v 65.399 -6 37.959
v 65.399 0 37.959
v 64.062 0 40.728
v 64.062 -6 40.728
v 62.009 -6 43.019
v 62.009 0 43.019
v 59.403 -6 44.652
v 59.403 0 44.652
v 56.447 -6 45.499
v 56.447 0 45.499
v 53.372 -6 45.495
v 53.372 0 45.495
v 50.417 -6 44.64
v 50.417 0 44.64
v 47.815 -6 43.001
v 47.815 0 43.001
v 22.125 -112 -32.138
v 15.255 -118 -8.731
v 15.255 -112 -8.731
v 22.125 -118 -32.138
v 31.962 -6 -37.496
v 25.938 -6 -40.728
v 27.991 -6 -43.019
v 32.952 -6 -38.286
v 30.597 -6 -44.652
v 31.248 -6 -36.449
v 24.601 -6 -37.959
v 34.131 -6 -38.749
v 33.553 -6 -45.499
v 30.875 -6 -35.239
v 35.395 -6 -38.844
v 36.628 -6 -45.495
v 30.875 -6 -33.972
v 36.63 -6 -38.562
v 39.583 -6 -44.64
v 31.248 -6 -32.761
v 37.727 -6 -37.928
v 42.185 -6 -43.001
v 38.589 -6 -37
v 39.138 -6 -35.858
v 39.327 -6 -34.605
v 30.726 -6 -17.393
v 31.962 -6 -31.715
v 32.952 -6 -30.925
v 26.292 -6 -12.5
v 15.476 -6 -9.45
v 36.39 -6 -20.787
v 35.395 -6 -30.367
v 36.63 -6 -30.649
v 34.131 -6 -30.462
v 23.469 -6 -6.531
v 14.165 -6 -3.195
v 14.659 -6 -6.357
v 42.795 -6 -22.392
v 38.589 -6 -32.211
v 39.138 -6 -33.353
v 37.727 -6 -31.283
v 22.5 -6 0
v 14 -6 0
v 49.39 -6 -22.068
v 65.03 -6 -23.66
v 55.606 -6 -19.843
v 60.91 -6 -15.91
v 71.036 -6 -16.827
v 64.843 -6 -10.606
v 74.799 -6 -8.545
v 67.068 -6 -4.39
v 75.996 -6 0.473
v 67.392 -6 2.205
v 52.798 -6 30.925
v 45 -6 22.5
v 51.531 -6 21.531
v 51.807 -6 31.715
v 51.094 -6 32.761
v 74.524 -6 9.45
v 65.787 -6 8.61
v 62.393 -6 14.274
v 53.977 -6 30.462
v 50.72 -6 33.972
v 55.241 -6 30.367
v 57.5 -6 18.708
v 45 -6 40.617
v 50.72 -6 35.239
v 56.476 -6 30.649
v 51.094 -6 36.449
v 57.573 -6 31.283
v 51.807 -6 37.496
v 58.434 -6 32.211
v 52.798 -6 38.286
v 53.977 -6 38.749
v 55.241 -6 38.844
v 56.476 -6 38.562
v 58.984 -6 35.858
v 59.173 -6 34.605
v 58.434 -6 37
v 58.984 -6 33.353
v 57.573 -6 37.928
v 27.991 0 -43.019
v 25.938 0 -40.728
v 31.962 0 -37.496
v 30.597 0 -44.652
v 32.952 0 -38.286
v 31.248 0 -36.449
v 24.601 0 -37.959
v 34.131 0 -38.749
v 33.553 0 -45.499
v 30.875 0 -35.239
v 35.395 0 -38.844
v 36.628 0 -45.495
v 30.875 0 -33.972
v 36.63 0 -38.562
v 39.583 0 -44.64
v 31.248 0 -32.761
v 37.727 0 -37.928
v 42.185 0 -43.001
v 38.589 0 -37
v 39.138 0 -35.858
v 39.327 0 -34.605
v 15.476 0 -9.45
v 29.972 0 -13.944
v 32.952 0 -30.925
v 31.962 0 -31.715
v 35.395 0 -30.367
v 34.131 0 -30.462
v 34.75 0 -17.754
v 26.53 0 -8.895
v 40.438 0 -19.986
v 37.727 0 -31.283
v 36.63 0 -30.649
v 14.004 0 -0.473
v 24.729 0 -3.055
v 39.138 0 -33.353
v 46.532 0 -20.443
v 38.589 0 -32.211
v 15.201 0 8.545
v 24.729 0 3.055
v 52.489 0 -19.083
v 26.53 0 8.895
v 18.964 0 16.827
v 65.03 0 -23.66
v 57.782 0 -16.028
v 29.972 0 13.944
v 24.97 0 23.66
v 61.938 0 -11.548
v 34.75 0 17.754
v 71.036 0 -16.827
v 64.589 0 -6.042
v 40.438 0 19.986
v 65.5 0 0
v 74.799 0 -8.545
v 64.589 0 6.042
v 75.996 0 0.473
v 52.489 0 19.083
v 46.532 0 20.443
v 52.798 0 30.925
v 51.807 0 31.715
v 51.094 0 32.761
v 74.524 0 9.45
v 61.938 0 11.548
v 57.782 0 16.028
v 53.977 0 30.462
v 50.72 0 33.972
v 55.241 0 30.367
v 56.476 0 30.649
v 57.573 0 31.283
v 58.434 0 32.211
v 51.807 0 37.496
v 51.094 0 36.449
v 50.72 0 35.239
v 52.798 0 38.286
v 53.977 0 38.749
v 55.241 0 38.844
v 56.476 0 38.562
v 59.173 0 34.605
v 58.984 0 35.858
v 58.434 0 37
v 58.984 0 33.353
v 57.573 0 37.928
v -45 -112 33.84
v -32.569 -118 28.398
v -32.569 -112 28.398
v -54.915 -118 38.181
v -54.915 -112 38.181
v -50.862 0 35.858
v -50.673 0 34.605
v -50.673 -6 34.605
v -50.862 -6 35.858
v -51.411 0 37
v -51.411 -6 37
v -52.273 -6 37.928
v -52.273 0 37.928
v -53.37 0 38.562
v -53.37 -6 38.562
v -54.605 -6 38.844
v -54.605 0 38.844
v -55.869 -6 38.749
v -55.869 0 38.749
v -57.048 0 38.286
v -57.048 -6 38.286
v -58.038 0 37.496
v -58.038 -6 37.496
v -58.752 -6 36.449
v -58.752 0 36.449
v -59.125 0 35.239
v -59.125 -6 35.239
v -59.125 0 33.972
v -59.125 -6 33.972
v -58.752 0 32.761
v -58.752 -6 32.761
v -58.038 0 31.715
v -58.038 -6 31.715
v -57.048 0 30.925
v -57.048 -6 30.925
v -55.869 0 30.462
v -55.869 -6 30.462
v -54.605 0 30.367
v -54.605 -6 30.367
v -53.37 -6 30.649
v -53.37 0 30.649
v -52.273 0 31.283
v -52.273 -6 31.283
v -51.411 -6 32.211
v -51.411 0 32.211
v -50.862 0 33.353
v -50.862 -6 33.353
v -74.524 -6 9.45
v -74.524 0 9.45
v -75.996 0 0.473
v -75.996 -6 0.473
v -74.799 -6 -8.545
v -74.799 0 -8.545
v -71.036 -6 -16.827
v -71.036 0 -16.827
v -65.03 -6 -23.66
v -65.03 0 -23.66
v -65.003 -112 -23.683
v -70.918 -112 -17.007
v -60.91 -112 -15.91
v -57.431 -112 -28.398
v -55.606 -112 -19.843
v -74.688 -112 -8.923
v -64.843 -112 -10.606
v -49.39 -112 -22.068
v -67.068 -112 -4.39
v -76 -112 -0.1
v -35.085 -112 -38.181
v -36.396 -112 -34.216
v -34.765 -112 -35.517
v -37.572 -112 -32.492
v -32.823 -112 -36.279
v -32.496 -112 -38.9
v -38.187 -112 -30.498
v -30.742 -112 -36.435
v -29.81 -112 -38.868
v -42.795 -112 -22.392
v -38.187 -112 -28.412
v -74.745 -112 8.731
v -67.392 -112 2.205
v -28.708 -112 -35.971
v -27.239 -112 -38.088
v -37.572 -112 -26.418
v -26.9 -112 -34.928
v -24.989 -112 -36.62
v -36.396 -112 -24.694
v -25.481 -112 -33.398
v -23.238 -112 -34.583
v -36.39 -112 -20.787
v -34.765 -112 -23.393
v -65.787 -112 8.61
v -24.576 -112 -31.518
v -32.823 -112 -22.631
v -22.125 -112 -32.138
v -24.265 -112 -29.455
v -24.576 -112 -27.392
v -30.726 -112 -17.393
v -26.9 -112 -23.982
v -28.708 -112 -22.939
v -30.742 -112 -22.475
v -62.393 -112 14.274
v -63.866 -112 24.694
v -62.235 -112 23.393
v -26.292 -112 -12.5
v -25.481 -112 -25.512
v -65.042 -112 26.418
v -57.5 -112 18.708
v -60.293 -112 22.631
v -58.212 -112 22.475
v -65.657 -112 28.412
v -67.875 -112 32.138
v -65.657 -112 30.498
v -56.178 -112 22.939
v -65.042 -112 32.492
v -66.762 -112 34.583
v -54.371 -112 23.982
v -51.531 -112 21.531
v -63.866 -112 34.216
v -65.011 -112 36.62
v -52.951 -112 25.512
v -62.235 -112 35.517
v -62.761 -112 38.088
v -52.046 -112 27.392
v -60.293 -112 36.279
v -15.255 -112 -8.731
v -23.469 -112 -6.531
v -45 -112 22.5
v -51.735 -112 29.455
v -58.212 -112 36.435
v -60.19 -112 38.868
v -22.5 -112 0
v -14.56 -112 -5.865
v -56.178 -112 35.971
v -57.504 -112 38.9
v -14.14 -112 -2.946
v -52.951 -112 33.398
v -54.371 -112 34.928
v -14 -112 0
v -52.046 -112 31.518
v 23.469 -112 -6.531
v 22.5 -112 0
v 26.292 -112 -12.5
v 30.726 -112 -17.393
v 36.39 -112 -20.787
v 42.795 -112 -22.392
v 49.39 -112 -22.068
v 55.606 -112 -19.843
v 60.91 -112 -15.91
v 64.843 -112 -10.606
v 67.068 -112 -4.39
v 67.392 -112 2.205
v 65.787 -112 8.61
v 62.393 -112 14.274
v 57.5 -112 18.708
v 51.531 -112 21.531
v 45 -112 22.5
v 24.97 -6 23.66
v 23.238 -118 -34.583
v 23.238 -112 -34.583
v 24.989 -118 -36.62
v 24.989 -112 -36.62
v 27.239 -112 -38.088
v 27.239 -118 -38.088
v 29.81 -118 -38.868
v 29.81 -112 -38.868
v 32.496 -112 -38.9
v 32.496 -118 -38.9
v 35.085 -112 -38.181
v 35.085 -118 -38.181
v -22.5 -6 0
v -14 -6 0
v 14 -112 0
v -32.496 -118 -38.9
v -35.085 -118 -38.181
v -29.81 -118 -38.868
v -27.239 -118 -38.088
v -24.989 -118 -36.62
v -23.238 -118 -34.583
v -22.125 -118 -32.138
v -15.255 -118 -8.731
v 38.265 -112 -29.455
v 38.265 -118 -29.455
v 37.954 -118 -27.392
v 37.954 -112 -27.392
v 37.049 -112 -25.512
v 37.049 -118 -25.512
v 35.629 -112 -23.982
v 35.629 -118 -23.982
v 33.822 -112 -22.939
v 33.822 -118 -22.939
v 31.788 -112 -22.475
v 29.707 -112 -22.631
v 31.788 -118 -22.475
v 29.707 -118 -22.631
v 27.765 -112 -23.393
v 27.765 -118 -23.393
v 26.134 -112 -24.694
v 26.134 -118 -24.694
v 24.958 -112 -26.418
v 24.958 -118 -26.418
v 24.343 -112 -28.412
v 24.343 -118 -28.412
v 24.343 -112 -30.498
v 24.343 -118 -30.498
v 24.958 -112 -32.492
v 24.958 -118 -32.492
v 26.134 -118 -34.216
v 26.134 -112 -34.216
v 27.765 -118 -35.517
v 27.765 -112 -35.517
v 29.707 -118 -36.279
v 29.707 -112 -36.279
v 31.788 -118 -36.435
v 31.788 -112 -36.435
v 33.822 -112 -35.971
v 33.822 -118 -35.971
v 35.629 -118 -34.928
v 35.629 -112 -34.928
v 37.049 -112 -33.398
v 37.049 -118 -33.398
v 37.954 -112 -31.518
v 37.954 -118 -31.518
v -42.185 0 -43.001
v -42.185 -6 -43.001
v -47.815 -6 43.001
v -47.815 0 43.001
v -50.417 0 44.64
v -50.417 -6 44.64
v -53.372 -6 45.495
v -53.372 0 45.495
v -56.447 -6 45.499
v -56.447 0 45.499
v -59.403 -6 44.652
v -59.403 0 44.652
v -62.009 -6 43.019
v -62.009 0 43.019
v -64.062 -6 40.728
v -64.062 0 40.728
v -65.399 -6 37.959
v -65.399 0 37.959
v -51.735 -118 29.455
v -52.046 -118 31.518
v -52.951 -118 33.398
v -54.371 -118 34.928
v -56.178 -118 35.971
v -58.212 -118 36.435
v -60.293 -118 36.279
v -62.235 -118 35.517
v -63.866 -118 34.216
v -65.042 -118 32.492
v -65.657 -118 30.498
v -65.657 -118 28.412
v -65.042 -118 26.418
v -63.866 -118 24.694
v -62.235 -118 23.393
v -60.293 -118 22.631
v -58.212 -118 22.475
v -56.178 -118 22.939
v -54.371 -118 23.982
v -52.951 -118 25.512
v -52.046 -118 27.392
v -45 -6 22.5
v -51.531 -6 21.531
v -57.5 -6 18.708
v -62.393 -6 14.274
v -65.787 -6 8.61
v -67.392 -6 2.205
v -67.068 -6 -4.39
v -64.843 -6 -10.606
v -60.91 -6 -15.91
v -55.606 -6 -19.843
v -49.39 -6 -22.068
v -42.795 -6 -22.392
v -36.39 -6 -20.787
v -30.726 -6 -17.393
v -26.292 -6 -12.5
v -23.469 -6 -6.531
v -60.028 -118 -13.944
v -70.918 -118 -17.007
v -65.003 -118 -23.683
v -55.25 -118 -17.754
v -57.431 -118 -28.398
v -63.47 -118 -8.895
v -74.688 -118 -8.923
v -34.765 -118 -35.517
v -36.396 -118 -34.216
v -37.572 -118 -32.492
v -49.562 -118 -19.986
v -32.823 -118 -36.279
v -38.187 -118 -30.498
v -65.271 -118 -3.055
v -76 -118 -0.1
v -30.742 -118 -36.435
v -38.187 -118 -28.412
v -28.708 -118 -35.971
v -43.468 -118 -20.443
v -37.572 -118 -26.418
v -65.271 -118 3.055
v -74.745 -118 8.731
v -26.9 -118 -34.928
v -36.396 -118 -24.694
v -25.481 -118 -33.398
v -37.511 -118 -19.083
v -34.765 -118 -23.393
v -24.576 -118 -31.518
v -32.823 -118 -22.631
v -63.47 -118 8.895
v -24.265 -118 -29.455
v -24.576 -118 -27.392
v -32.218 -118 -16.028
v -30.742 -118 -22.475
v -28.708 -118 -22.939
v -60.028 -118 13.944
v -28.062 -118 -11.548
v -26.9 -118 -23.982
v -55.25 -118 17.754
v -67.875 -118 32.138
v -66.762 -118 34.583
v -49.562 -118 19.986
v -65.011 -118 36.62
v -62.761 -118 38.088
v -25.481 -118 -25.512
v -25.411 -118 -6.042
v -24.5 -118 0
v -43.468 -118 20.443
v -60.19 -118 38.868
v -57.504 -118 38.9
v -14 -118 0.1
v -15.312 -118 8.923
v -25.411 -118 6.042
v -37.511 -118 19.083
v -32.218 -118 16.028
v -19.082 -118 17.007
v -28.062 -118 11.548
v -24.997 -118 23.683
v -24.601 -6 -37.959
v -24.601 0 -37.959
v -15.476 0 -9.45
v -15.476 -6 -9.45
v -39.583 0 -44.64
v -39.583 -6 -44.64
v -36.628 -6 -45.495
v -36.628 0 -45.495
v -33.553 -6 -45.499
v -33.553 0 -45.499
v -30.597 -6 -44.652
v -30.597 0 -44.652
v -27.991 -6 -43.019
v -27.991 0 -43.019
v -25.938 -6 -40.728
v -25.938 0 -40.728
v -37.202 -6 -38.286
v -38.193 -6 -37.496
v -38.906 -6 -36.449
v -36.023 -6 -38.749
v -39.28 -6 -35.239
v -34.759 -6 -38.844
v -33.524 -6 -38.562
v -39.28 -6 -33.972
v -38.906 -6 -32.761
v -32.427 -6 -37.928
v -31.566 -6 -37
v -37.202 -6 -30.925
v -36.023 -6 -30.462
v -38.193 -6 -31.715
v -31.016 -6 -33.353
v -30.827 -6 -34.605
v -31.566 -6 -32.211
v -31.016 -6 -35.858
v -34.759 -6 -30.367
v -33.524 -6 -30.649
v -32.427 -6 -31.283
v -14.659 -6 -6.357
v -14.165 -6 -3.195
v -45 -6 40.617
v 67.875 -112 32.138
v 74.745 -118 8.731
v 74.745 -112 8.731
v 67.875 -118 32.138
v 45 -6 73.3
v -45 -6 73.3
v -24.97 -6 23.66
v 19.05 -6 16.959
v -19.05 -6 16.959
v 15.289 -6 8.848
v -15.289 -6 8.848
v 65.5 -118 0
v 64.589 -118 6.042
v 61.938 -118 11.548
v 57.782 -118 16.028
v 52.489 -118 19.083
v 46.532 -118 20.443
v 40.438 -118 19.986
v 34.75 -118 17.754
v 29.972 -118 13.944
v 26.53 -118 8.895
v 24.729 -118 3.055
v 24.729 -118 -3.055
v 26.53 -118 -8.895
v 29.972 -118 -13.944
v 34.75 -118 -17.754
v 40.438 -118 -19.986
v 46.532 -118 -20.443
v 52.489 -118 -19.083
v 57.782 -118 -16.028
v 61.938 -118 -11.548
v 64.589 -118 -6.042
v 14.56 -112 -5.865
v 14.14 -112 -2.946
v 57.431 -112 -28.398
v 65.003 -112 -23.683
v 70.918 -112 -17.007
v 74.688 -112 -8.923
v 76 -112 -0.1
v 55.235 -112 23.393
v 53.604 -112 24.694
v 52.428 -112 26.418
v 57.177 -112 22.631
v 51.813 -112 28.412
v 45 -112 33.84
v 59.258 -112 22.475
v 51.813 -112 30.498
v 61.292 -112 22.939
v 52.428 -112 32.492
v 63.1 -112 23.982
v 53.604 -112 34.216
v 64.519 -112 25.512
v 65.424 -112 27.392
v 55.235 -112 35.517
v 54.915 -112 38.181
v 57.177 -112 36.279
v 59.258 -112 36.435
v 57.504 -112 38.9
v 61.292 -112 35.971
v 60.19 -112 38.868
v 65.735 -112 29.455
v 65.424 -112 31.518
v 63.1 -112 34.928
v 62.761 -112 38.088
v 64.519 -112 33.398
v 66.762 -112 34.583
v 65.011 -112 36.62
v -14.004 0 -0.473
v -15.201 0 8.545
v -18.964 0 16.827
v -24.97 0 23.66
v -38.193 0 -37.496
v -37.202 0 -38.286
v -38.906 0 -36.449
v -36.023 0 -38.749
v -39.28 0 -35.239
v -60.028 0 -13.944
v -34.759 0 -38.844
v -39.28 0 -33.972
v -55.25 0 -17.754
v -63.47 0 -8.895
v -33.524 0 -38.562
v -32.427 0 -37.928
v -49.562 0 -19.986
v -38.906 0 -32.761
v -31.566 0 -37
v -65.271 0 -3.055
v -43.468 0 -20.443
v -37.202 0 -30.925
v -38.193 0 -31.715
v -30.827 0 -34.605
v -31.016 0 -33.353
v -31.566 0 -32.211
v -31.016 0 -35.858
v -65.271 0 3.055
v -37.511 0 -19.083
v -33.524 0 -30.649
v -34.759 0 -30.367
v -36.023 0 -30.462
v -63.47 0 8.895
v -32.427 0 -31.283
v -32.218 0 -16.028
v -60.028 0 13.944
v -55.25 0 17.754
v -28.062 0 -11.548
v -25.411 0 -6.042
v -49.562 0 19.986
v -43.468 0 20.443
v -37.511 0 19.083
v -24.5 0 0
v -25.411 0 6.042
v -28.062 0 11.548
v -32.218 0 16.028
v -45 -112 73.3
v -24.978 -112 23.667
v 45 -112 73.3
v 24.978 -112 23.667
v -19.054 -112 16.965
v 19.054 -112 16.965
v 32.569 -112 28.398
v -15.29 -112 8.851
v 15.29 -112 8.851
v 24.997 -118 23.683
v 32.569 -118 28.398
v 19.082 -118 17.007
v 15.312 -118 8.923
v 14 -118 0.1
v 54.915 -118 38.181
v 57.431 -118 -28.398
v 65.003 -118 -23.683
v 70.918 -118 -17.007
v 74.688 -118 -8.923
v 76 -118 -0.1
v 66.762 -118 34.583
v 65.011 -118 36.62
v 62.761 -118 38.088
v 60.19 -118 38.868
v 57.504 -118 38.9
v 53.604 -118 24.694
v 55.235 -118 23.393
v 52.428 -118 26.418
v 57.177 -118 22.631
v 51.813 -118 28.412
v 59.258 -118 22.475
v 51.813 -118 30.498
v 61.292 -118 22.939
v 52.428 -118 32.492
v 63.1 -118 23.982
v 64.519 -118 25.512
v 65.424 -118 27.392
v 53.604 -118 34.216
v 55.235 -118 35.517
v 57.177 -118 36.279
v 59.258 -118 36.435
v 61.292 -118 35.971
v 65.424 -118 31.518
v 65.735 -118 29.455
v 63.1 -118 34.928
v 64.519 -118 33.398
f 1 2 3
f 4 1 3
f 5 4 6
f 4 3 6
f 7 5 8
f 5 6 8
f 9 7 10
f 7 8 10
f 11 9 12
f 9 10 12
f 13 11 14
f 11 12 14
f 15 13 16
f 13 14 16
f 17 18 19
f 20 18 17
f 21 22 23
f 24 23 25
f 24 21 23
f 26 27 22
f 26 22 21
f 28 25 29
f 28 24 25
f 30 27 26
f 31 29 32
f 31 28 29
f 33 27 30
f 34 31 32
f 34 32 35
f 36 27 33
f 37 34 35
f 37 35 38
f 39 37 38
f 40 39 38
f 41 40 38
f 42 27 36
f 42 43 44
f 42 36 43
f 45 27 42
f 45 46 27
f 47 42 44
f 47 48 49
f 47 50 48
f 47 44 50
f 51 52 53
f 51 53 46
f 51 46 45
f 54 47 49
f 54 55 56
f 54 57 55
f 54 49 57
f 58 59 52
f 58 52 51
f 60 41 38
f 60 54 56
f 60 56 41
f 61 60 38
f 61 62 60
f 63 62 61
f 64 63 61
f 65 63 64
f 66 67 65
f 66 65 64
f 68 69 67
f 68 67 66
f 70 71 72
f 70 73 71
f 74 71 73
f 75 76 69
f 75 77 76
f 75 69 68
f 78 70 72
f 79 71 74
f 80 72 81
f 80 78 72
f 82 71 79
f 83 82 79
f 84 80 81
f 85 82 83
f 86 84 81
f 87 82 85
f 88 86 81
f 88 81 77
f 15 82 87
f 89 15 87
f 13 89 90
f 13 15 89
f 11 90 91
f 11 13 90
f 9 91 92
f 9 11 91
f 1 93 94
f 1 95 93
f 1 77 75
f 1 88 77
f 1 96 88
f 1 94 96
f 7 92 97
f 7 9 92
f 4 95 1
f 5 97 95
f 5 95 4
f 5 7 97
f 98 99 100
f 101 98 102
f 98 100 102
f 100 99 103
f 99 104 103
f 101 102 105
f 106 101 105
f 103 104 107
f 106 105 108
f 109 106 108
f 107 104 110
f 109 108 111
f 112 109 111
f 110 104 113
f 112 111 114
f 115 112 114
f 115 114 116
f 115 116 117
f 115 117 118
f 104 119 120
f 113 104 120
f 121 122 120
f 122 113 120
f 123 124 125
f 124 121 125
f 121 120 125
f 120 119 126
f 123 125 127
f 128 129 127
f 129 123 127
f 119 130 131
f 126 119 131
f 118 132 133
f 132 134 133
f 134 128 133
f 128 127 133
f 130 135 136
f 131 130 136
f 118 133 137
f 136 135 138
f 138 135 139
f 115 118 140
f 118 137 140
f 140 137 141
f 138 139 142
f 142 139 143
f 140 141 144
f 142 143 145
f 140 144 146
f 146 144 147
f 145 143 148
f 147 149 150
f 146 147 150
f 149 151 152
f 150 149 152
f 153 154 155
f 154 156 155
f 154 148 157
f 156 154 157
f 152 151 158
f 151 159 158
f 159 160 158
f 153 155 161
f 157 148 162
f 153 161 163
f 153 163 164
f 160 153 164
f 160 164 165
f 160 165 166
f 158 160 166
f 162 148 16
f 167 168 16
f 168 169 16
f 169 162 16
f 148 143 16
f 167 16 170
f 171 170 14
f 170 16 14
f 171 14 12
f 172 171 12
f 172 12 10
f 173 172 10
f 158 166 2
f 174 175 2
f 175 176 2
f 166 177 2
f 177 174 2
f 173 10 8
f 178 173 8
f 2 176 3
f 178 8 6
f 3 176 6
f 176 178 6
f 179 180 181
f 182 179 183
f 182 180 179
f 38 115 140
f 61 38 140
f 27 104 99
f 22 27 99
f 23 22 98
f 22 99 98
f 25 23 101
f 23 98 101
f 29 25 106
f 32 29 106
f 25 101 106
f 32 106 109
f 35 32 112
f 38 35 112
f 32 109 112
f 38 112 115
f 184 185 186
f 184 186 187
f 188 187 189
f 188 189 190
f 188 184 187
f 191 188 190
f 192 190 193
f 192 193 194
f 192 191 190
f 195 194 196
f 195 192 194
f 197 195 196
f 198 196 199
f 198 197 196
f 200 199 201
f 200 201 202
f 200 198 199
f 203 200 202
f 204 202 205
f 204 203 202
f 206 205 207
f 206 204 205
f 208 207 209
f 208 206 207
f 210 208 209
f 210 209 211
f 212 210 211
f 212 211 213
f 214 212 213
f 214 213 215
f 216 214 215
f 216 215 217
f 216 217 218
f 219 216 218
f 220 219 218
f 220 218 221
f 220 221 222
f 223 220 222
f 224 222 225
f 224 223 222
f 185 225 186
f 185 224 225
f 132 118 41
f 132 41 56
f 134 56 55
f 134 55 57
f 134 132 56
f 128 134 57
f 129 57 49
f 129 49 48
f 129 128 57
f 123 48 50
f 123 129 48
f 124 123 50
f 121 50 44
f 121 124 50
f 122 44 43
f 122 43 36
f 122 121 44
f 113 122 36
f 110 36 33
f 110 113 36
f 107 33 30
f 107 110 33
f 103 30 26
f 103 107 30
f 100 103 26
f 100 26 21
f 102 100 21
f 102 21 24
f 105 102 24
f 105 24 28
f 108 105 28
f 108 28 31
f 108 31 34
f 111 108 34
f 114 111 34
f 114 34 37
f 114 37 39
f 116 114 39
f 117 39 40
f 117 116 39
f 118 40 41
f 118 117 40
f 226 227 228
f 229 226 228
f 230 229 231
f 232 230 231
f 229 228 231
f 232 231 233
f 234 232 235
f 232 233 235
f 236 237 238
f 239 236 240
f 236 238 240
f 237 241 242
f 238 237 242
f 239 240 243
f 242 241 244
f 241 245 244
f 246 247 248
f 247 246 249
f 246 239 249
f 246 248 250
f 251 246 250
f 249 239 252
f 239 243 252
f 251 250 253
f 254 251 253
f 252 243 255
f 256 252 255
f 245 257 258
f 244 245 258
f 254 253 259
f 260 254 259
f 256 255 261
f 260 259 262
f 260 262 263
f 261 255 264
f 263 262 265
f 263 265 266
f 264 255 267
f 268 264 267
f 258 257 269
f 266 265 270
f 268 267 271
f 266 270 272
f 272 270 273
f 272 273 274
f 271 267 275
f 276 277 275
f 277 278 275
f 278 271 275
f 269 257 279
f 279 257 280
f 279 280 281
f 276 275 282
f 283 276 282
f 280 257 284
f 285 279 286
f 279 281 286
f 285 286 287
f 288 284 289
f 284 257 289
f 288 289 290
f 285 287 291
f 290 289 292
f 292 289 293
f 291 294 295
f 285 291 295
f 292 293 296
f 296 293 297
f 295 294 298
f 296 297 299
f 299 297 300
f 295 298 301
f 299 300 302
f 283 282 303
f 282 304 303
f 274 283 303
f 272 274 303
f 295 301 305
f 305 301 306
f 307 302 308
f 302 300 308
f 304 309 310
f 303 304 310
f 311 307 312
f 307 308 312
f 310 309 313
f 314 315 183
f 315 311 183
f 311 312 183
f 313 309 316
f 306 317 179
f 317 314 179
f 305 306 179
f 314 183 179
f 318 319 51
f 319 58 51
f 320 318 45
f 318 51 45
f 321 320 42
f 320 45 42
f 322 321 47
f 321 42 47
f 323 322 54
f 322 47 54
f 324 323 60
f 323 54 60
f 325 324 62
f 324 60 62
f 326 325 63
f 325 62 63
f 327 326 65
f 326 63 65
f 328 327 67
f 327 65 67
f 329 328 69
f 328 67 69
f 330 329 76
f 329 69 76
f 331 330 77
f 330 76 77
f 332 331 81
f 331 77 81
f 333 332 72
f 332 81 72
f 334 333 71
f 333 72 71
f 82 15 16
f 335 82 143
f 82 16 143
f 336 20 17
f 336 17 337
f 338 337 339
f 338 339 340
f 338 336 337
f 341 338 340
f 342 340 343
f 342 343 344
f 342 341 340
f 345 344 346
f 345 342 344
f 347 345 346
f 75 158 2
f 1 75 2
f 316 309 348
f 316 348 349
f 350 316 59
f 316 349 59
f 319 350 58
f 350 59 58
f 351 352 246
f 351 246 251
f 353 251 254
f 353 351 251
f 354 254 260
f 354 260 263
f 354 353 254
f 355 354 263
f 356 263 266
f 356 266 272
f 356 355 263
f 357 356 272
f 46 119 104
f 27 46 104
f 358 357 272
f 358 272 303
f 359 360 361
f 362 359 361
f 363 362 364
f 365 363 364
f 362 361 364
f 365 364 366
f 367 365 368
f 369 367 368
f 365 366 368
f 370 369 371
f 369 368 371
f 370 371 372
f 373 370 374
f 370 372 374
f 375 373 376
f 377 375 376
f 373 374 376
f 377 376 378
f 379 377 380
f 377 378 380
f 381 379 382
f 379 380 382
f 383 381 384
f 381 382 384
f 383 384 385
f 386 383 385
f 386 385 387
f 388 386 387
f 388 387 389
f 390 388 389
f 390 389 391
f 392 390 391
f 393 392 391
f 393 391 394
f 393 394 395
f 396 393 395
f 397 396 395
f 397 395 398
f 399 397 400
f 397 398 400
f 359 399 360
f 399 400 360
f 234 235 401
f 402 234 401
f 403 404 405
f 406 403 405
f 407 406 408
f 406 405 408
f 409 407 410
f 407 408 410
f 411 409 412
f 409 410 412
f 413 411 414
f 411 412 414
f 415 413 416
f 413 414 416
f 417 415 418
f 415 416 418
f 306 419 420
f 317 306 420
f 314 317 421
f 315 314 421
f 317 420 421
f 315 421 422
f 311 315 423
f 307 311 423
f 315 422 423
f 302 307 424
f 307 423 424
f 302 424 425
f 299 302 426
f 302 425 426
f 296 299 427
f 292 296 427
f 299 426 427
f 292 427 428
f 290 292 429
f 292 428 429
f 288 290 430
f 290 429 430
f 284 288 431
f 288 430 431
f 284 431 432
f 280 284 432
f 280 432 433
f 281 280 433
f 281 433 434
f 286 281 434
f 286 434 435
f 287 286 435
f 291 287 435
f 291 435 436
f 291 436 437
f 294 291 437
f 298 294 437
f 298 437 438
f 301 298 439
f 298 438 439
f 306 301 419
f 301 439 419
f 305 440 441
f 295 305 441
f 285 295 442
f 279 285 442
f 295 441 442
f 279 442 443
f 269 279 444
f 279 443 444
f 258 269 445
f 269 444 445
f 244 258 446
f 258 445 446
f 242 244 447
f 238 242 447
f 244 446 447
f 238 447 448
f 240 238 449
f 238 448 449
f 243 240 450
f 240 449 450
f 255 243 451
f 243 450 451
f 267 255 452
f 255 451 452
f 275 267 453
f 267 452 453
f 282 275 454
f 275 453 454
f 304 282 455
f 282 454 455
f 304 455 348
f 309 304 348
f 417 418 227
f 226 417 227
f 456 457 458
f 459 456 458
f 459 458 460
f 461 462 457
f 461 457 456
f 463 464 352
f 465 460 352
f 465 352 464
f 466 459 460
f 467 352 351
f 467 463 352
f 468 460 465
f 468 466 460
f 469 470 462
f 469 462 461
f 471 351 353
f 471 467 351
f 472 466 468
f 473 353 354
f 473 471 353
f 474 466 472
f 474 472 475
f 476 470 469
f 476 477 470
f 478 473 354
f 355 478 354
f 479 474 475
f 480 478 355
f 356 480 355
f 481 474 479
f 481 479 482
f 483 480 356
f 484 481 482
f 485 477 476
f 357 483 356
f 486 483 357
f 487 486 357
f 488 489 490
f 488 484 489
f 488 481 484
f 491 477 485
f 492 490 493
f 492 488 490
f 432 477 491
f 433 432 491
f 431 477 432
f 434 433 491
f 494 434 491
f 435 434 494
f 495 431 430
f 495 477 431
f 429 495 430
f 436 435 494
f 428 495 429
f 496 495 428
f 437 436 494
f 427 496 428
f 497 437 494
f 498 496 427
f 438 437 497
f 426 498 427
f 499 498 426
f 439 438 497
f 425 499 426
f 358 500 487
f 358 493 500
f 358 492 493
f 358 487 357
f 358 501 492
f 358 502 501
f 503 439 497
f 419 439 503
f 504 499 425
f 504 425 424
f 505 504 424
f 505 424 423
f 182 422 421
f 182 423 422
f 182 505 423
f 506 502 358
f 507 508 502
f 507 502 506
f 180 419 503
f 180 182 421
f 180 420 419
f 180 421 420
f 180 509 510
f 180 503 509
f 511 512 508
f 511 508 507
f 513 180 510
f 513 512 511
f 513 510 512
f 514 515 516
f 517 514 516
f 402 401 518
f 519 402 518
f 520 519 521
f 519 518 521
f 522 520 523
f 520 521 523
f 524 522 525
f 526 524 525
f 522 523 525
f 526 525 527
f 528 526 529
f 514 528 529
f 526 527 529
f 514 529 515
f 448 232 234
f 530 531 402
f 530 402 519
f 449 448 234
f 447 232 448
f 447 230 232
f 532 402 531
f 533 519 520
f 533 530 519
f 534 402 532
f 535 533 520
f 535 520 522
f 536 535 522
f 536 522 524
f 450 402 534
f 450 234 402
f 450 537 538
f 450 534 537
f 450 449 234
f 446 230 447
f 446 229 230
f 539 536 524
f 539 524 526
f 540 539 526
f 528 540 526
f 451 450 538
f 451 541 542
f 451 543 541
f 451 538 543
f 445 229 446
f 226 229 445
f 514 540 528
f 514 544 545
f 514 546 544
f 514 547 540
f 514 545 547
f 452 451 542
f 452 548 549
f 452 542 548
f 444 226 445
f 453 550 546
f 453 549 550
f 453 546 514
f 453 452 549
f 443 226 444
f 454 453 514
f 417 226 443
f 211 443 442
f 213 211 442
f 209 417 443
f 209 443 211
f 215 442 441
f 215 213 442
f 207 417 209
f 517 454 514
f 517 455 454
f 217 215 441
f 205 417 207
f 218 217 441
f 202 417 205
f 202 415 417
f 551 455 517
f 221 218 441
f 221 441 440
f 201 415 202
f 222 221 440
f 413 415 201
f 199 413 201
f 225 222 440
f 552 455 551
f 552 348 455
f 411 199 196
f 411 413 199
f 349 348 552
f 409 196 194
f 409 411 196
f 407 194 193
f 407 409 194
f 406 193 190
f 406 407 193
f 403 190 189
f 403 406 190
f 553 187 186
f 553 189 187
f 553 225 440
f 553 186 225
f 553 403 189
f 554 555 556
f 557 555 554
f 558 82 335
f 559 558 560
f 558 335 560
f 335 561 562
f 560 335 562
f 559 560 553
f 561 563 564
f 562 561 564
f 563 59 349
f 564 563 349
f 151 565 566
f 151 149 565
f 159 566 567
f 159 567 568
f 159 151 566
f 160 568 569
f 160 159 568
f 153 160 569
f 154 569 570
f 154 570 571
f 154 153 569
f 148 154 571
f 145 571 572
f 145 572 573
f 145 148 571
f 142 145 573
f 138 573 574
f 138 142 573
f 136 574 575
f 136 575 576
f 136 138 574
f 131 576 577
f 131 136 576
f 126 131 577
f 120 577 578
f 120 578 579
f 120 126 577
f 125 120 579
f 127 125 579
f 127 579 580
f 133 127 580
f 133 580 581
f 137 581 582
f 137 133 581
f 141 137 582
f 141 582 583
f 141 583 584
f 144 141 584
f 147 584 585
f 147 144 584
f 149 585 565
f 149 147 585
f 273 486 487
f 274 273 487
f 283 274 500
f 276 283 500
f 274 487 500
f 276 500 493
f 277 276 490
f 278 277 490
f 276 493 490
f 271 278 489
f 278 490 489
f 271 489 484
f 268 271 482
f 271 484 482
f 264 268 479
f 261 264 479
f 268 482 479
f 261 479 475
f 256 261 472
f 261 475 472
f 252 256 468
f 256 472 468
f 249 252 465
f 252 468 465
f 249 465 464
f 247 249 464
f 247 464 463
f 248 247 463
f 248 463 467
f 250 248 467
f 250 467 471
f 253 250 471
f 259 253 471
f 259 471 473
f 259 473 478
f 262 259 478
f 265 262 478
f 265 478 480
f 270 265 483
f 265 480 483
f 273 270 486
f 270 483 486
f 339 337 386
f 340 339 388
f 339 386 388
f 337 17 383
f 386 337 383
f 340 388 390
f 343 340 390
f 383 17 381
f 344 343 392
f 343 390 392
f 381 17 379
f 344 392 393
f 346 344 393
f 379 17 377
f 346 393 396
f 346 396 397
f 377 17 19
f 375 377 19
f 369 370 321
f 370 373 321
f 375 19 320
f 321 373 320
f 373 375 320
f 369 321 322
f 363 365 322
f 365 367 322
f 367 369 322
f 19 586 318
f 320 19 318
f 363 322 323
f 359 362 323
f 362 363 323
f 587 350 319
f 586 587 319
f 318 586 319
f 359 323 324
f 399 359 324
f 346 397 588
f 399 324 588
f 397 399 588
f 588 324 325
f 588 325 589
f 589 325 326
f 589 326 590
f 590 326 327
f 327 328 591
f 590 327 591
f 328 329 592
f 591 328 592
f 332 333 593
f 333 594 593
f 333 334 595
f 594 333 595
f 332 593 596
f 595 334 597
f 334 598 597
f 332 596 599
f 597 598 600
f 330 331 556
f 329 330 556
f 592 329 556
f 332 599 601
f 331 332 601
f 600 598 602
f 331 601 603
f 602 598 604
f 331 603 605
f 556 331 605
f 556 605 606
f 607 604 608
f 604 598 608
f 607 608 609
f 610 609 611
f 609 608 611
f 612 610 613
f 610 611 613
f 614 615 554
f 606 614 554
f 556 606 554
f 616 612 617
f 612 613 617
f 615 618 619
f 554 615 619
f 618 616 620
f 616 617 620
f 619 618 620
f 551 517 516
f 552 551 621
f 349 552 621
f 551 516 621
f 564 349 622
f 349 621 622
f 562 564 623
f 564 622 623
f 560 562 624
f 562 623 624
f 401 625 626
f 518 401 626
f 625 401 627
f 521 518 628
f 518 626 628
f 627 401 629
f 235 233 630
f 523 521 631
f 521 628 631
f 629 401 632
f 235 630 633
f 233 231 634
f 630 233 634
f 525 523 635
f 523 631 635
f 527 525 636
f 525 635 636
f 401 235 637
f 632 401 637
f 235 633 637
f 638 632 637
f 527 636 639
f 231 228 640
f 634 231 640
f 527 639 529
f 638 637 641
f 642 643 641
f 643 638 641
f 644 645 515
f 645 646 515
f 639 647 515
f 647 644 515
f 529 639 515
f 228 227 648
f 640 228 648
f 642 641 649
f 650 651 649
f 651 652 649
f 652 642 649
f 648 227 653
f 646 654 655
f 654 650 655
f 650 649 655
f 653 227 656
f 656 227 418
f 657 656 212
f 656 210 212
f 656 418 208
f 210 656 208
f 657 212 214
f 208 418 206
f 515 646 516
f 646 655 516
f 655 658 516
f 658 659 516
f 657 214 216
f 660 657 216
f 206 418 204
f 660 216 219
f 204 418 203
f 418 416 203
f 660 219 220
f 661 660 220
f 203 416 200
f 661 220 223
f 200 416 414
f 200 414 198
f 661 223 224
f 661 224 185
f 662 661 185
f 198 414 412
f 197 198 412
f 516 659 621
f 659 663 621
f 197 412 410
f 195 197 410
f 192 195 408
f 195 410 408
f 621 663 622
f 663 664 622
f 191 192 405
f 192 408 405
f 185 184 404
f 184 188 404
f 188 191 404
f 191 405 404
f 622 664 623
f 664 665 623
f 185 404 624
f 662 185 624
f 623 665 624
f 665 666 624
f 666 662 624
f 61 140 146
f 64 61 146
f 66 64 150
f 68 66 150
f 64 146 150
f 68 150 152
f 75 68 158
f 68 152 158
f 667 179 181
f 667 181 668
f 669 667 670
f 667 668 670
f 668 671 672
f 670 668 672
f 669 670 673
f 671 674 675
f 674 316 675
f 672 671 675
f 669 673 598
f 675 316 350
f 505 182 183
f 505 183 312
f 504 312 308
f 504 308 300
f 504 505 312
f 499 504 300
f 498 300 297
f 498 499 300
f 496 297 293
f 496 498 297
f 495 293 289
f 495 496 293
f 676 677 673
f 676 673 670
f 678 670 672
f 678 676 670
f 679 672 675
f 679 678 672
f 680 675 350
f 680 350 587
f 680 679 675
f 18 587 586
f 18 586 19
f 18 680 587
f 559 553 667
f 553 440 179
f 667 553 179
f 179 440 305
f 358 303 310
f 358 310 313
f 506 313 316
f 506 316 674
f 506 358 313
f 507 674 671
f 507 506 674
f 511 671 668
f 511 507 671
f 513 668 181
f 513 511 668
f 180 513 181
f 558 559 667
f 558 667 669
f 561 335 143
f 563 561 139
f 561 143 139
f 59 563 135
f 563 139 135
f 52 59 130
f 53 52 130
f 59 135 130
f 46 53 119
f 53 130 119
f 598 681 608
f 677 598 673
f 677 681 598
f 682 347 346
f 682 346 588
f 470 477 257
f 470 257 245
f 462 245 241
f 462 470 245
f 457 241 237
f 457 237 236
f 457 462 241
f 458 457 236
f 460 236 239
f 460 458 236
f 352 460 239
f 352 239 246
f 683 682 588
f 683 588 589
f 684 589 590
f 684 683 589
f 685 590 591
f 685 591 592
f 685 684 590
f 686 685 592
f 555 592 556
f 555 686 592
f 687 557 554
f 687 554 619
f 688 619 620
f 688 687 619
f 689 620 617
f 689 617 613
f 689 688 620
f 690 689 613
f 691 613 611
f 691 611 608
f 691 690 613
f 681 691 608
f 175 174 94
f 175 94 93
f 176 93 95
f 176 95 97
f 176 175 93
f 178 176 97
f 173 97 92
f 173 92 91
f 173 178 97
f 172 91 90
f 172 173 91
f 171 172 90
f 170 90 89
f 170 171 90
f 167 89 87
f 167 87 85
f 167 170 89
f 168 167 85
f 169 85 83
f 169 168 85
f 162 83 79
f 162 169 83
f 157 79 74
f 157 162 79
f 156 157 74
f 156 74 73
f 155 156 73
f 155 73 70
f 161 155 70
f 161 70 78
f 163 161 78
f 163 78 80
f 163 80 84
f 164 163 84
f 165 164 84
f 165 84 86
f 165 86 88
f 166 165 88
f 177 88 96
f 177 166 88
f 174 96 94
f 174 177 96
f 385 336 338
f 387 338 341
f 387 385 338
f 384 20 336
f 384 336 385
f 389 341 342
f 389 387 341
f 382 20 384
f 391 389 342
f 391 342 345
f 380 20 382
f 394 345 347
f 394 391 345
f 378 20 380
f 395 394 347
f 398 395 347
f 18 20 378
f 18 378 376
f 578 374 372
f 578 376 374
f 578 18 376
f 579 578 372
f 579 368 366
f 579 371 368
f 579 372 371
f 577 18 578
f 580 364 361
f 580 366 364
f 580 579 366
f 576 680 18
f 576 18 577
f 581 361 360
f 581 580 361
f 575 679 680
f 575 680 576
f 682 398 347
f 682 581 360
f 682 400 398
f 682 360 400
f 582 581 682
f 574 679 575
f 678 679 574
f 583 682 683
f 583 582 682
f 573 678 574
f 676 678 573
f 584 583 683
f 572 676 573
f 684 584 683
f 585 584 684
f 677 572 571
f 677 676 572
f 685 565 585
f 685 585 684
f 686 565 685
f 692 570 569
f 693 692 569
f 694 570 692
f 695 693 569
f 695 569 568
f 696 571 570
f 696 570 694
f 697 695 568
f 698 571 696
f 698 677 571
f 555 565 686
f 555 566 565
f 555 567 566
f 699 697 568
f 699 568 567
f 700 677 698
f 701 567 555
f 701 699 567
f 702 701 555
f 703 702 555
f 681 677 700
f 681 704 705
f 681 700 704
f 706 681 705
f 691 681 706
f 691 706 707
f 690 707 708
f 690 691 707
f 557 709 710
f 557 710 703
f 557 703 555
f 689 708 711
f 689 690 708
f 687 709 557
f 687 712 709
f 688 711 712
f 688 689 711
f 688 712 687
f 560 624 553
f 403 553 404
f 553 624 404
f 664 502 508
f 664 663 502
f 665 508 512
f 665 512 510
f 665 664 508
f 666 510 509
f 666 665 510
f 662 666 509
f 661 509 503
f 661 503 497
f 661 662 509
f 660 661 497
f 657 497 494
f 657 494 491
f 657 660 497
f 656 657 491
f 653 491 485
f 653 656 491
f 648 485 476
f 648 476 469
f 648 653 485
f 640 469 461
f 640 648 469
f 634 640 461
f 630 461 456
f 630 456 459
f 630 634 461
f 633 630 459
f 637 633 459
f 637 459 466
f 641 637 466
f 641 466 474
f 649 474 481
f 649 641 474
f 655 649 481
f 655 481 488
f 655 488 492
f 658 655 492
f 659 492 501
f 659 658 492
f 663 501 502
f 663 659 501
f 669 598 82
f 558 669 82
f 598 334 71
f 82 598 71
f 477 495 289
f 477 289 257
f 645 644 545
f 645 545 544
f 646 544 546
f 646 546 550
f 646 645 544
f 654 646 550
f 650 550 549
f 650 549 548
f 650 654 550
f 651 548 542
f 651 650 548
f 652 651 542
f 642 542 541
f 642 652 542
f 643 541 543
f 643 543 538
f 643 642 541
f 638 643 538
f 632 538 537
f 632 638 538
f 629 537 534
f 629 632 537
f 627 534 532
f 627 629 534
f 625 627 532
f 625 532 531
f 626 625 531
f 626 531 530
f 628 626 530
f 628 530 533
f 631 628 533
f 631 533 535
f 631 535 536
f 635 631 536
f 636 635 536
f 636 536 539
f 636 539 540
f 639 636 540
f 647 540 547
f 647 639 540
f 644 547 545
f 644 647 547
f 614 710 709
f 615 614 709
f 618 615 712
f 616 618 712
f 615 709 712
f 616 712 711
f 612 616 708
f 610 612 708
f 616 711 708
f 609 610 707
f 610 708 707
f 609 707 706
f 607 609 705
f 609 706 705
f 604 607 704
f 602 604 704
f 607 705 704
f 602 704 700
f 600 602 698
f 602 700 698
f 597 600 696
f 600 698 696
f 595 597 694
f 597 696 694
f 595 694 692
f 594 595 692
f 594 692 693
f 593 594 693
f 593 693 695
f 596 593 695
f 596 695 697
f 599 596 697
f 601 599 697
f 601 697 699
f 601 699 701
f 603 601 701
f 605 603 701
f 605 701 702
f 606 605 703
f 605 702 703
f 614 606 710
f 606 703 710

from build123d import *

# Parameters (mm, degrees)
F0_R      = 4.25
F0_R_2    = 20.5
F1_DEPTH  = 6
F3_R      = 7
F3_R_2    = 22.5
F4_DEPTH  = 6
F5_R      = 22.5
F5_R_2    = 20.5
F6_DEPTH  = 112
F9_DEPTH  = 106
F10_DEPTH = 50.8


with BuildPart() as f1:
    # F0 (on Front) → F1 (new body)
    with BuildSketch(Plane.XZ):
        with BuildLine():
            Line((-65.399358, 37.958743), (-74.524437, 9.450272))
            ThreePointArc((-74.524437, 9.450272), (-74.799113, -8.544758), (-65.030261, -23.659853))
            Line((-65.030261, -23.659853), (-42.184567, -43.000853))
            ThreePointArc((-42.184567, -43.000853), (-32.045044, -45.1793), (-24.600642, -37.958743))
            Line((-24.600642, -37.958743), (-15.475563, -9.450272))
            ThreePointArc((-15.475563, -9.450272), (-15.200887, 8.544758), (-24.969739, 23.659853))
            Line((-24.969739, 23.659853), (-47.815433, 43.000853))
            ThreePointArc((-47.815433, 43.000853), (-57.954956, 45.1793), (-65.399358, 37.958743))
        make_face()
        with Locations((-35.077055, -34.605421)):
            Circle(F0_R, mode=Mode.SUBTRACT)
        with Locations((-45, 0)):
            Circle(F0_R_2, mode=Mode.SUBTRACT)
        with Locations((-54.922945, 34.605421)):
            Circle(F0_R, mode=Mode.SUBTRACT)
        with BuildLine():
            ThreePointArc((24.969739, 23.659853), (15.200887, 8.544758), (15.475563, -9.450272))
            Line((15.475563, -9.450272), (24.600642, -37.958743))
            ThreePointArc((24.600642, -37.958743), (32.045044, -45.1793), (42.184567, -43.000853))
            Line((42.184567, -43.000853), (65.030261, -23.659853))
            ThreePointArc((65.030261, -23.659853), (74.799113, -8.544758), (74.524437, 9.450272))
            Line((74.524437, 9.450272), (65.399358, 37.958743))
            ThreePointArc((65.399358, 37.958743), (57.954956, 45.1793), (47.815433, 43.000853))
            Line((47.815433, 43.000853), (24.969739, 23.659853))
        make_face()
        with Locations((35.077055, -34.605421)):
            Circle(F0_R, mode=Mode.SUBTRACT)
        with Locations((45, 0)):
            Circle(F0_R_2, mode=Mode.SUBTRACT)
        with Locations((54.922945, 34.605421)):
            Circle(F0_R, mode=Mode.SUBTRACT)
    extrude(amount=F1_DEPTH)



with BuildPart() as f4:
    # F3 (on offset) → F4 (new body)
    with BuildSketch(Plane.XZ.offset(118)):
        with BuildLine():
            Line((15.254945, -8.731077), (22.125498, -32.137697))
            ThreePointArc((22.125498, -32.137697), (27.239468, -38.087585), (35.084542, -38.180598))
            Line((35.084542, -38.180598), (57.43136, -28.398262))
            ThreePointArc((57.43136, -28.398262), (73.095541, -13.101166), (74.745055, 8.731077))
            Line((74.745055, 8.731077), (67.874502, 32.137697))
            ThreePointArc((67.874502, 32.137697), (62.760532, 38.087585), (54.915458, 38.180598))
            Line((54.915458, 38.180598), (32.56864, 28.398262))
            ThreePointArc((32.56864, 28.398262), (16.904459, 13.101166), (15.254945, -8.731077))
        make_face()
        with Locations((31.264906, -29.455003)):
            Circle(F3_R, mode=Mode.SUBTRACT)
        with Locations((45, 0)):
            Circle(F3_R_2, mode=Mode.SUBTRACT)
        with Locations((58.735094, 29.455003)):
            Circle(F3_R, mode=Mode.SUBTRACT)
        with BuildLine():
            ThreePointArc((-54.915458, 38.180598), (-62.760532, 38.087585), (-67.874502, 32.137697))
            Line((-67.874502, 32.137697), (-74.745055, 8.731077))
            ThreePointArc((-74.745055, 8.731077), (-73.095541, -13.101166), (-57.43136, -28.398262))
            Line((-57.43136, -28.398262), (-35.084542, -38.180598))
            ThreePointArc((-35.084542, -38.180598), (-27.239468, -38.087585), (-22.125498, -32.137697))
            Line((-22.125498, -32.137697), (-15.254945, -8.731077))
            ThreePointArc((-15.254945, -8.731077), (-16.904459, 13.101166), (-32.56864, 28.398262))
            Line((-32.56864, 28.398262), (-54.915458, 38.180598))
        make_face()
        with Locations((-31.264906, -29.455003)):
            Circle(F3_R, mode=Mode.SUBTRACT)
        with Locations((-45, 0)):
            Circle(F3_R_2, mode=Mode.SUBTRACT)
        with Locations((-58.735094, 29.455003)):
            Circle(F3_R, mode=Mode.SUBTRACT)
    extrude(amount=-F4_DEPTH)


with BuildPart() as f6:
    # F5 (on face) → F6 (new body, through all)
    with BuildSketch(Plane.XZ.offset(6)):
        with Locations((-45, 0)):
            Circle(F5_R)
        with Locations((-45, 0)):
            Circle(F5_R_2, mode=Mode.SUBTRACT)
        with Locations((45, 0)):
            Circle(F5_R)
        with Locations((45, 0)):
            Circle(F5_R_2, mode=Mode.SUBTRACT)
    extrude(amount=F6_DEPTH)

    # F7: union F4
    add(f4.part)


with BuildPart() as f1_1:
    add(f1.part)

    add(f6.part)  # F9 merges F6
    # F8 (on face) → F9 (join, through all)
    with BuildSketch(Plane.XZ.offset(6)):
        with BuildLine():
            ThreePointArc((-45, 22.5), (-29.090097, 15.909903), (-22.5, 0))
            Line((-22.5, 0), (22.5, 0))
            ThreePointArc((22.5, 0), (29.090097, 15.909903), (45, 22.5))
            Line((45, 22.5), (-45, 22.5))
        make_face()
    extrude(amount=F9_DEPTH)

    # F9_face (on face) → F10 (join)
    with BuildSketch(Plane(origin=(0, -59, 22.5), x_dir=(1, 0, 0), z_dir=(0, 0, 1))):
        Polygon((45, -53), (45, 53), (23.675132, 53), (-23.675132, 53), (-45, 53), (-45, -53), (-23.675132, -53), (23.675132, -53), align=None)
    extrude(amount=F10_DEPTH)


solid = f1_1.part
